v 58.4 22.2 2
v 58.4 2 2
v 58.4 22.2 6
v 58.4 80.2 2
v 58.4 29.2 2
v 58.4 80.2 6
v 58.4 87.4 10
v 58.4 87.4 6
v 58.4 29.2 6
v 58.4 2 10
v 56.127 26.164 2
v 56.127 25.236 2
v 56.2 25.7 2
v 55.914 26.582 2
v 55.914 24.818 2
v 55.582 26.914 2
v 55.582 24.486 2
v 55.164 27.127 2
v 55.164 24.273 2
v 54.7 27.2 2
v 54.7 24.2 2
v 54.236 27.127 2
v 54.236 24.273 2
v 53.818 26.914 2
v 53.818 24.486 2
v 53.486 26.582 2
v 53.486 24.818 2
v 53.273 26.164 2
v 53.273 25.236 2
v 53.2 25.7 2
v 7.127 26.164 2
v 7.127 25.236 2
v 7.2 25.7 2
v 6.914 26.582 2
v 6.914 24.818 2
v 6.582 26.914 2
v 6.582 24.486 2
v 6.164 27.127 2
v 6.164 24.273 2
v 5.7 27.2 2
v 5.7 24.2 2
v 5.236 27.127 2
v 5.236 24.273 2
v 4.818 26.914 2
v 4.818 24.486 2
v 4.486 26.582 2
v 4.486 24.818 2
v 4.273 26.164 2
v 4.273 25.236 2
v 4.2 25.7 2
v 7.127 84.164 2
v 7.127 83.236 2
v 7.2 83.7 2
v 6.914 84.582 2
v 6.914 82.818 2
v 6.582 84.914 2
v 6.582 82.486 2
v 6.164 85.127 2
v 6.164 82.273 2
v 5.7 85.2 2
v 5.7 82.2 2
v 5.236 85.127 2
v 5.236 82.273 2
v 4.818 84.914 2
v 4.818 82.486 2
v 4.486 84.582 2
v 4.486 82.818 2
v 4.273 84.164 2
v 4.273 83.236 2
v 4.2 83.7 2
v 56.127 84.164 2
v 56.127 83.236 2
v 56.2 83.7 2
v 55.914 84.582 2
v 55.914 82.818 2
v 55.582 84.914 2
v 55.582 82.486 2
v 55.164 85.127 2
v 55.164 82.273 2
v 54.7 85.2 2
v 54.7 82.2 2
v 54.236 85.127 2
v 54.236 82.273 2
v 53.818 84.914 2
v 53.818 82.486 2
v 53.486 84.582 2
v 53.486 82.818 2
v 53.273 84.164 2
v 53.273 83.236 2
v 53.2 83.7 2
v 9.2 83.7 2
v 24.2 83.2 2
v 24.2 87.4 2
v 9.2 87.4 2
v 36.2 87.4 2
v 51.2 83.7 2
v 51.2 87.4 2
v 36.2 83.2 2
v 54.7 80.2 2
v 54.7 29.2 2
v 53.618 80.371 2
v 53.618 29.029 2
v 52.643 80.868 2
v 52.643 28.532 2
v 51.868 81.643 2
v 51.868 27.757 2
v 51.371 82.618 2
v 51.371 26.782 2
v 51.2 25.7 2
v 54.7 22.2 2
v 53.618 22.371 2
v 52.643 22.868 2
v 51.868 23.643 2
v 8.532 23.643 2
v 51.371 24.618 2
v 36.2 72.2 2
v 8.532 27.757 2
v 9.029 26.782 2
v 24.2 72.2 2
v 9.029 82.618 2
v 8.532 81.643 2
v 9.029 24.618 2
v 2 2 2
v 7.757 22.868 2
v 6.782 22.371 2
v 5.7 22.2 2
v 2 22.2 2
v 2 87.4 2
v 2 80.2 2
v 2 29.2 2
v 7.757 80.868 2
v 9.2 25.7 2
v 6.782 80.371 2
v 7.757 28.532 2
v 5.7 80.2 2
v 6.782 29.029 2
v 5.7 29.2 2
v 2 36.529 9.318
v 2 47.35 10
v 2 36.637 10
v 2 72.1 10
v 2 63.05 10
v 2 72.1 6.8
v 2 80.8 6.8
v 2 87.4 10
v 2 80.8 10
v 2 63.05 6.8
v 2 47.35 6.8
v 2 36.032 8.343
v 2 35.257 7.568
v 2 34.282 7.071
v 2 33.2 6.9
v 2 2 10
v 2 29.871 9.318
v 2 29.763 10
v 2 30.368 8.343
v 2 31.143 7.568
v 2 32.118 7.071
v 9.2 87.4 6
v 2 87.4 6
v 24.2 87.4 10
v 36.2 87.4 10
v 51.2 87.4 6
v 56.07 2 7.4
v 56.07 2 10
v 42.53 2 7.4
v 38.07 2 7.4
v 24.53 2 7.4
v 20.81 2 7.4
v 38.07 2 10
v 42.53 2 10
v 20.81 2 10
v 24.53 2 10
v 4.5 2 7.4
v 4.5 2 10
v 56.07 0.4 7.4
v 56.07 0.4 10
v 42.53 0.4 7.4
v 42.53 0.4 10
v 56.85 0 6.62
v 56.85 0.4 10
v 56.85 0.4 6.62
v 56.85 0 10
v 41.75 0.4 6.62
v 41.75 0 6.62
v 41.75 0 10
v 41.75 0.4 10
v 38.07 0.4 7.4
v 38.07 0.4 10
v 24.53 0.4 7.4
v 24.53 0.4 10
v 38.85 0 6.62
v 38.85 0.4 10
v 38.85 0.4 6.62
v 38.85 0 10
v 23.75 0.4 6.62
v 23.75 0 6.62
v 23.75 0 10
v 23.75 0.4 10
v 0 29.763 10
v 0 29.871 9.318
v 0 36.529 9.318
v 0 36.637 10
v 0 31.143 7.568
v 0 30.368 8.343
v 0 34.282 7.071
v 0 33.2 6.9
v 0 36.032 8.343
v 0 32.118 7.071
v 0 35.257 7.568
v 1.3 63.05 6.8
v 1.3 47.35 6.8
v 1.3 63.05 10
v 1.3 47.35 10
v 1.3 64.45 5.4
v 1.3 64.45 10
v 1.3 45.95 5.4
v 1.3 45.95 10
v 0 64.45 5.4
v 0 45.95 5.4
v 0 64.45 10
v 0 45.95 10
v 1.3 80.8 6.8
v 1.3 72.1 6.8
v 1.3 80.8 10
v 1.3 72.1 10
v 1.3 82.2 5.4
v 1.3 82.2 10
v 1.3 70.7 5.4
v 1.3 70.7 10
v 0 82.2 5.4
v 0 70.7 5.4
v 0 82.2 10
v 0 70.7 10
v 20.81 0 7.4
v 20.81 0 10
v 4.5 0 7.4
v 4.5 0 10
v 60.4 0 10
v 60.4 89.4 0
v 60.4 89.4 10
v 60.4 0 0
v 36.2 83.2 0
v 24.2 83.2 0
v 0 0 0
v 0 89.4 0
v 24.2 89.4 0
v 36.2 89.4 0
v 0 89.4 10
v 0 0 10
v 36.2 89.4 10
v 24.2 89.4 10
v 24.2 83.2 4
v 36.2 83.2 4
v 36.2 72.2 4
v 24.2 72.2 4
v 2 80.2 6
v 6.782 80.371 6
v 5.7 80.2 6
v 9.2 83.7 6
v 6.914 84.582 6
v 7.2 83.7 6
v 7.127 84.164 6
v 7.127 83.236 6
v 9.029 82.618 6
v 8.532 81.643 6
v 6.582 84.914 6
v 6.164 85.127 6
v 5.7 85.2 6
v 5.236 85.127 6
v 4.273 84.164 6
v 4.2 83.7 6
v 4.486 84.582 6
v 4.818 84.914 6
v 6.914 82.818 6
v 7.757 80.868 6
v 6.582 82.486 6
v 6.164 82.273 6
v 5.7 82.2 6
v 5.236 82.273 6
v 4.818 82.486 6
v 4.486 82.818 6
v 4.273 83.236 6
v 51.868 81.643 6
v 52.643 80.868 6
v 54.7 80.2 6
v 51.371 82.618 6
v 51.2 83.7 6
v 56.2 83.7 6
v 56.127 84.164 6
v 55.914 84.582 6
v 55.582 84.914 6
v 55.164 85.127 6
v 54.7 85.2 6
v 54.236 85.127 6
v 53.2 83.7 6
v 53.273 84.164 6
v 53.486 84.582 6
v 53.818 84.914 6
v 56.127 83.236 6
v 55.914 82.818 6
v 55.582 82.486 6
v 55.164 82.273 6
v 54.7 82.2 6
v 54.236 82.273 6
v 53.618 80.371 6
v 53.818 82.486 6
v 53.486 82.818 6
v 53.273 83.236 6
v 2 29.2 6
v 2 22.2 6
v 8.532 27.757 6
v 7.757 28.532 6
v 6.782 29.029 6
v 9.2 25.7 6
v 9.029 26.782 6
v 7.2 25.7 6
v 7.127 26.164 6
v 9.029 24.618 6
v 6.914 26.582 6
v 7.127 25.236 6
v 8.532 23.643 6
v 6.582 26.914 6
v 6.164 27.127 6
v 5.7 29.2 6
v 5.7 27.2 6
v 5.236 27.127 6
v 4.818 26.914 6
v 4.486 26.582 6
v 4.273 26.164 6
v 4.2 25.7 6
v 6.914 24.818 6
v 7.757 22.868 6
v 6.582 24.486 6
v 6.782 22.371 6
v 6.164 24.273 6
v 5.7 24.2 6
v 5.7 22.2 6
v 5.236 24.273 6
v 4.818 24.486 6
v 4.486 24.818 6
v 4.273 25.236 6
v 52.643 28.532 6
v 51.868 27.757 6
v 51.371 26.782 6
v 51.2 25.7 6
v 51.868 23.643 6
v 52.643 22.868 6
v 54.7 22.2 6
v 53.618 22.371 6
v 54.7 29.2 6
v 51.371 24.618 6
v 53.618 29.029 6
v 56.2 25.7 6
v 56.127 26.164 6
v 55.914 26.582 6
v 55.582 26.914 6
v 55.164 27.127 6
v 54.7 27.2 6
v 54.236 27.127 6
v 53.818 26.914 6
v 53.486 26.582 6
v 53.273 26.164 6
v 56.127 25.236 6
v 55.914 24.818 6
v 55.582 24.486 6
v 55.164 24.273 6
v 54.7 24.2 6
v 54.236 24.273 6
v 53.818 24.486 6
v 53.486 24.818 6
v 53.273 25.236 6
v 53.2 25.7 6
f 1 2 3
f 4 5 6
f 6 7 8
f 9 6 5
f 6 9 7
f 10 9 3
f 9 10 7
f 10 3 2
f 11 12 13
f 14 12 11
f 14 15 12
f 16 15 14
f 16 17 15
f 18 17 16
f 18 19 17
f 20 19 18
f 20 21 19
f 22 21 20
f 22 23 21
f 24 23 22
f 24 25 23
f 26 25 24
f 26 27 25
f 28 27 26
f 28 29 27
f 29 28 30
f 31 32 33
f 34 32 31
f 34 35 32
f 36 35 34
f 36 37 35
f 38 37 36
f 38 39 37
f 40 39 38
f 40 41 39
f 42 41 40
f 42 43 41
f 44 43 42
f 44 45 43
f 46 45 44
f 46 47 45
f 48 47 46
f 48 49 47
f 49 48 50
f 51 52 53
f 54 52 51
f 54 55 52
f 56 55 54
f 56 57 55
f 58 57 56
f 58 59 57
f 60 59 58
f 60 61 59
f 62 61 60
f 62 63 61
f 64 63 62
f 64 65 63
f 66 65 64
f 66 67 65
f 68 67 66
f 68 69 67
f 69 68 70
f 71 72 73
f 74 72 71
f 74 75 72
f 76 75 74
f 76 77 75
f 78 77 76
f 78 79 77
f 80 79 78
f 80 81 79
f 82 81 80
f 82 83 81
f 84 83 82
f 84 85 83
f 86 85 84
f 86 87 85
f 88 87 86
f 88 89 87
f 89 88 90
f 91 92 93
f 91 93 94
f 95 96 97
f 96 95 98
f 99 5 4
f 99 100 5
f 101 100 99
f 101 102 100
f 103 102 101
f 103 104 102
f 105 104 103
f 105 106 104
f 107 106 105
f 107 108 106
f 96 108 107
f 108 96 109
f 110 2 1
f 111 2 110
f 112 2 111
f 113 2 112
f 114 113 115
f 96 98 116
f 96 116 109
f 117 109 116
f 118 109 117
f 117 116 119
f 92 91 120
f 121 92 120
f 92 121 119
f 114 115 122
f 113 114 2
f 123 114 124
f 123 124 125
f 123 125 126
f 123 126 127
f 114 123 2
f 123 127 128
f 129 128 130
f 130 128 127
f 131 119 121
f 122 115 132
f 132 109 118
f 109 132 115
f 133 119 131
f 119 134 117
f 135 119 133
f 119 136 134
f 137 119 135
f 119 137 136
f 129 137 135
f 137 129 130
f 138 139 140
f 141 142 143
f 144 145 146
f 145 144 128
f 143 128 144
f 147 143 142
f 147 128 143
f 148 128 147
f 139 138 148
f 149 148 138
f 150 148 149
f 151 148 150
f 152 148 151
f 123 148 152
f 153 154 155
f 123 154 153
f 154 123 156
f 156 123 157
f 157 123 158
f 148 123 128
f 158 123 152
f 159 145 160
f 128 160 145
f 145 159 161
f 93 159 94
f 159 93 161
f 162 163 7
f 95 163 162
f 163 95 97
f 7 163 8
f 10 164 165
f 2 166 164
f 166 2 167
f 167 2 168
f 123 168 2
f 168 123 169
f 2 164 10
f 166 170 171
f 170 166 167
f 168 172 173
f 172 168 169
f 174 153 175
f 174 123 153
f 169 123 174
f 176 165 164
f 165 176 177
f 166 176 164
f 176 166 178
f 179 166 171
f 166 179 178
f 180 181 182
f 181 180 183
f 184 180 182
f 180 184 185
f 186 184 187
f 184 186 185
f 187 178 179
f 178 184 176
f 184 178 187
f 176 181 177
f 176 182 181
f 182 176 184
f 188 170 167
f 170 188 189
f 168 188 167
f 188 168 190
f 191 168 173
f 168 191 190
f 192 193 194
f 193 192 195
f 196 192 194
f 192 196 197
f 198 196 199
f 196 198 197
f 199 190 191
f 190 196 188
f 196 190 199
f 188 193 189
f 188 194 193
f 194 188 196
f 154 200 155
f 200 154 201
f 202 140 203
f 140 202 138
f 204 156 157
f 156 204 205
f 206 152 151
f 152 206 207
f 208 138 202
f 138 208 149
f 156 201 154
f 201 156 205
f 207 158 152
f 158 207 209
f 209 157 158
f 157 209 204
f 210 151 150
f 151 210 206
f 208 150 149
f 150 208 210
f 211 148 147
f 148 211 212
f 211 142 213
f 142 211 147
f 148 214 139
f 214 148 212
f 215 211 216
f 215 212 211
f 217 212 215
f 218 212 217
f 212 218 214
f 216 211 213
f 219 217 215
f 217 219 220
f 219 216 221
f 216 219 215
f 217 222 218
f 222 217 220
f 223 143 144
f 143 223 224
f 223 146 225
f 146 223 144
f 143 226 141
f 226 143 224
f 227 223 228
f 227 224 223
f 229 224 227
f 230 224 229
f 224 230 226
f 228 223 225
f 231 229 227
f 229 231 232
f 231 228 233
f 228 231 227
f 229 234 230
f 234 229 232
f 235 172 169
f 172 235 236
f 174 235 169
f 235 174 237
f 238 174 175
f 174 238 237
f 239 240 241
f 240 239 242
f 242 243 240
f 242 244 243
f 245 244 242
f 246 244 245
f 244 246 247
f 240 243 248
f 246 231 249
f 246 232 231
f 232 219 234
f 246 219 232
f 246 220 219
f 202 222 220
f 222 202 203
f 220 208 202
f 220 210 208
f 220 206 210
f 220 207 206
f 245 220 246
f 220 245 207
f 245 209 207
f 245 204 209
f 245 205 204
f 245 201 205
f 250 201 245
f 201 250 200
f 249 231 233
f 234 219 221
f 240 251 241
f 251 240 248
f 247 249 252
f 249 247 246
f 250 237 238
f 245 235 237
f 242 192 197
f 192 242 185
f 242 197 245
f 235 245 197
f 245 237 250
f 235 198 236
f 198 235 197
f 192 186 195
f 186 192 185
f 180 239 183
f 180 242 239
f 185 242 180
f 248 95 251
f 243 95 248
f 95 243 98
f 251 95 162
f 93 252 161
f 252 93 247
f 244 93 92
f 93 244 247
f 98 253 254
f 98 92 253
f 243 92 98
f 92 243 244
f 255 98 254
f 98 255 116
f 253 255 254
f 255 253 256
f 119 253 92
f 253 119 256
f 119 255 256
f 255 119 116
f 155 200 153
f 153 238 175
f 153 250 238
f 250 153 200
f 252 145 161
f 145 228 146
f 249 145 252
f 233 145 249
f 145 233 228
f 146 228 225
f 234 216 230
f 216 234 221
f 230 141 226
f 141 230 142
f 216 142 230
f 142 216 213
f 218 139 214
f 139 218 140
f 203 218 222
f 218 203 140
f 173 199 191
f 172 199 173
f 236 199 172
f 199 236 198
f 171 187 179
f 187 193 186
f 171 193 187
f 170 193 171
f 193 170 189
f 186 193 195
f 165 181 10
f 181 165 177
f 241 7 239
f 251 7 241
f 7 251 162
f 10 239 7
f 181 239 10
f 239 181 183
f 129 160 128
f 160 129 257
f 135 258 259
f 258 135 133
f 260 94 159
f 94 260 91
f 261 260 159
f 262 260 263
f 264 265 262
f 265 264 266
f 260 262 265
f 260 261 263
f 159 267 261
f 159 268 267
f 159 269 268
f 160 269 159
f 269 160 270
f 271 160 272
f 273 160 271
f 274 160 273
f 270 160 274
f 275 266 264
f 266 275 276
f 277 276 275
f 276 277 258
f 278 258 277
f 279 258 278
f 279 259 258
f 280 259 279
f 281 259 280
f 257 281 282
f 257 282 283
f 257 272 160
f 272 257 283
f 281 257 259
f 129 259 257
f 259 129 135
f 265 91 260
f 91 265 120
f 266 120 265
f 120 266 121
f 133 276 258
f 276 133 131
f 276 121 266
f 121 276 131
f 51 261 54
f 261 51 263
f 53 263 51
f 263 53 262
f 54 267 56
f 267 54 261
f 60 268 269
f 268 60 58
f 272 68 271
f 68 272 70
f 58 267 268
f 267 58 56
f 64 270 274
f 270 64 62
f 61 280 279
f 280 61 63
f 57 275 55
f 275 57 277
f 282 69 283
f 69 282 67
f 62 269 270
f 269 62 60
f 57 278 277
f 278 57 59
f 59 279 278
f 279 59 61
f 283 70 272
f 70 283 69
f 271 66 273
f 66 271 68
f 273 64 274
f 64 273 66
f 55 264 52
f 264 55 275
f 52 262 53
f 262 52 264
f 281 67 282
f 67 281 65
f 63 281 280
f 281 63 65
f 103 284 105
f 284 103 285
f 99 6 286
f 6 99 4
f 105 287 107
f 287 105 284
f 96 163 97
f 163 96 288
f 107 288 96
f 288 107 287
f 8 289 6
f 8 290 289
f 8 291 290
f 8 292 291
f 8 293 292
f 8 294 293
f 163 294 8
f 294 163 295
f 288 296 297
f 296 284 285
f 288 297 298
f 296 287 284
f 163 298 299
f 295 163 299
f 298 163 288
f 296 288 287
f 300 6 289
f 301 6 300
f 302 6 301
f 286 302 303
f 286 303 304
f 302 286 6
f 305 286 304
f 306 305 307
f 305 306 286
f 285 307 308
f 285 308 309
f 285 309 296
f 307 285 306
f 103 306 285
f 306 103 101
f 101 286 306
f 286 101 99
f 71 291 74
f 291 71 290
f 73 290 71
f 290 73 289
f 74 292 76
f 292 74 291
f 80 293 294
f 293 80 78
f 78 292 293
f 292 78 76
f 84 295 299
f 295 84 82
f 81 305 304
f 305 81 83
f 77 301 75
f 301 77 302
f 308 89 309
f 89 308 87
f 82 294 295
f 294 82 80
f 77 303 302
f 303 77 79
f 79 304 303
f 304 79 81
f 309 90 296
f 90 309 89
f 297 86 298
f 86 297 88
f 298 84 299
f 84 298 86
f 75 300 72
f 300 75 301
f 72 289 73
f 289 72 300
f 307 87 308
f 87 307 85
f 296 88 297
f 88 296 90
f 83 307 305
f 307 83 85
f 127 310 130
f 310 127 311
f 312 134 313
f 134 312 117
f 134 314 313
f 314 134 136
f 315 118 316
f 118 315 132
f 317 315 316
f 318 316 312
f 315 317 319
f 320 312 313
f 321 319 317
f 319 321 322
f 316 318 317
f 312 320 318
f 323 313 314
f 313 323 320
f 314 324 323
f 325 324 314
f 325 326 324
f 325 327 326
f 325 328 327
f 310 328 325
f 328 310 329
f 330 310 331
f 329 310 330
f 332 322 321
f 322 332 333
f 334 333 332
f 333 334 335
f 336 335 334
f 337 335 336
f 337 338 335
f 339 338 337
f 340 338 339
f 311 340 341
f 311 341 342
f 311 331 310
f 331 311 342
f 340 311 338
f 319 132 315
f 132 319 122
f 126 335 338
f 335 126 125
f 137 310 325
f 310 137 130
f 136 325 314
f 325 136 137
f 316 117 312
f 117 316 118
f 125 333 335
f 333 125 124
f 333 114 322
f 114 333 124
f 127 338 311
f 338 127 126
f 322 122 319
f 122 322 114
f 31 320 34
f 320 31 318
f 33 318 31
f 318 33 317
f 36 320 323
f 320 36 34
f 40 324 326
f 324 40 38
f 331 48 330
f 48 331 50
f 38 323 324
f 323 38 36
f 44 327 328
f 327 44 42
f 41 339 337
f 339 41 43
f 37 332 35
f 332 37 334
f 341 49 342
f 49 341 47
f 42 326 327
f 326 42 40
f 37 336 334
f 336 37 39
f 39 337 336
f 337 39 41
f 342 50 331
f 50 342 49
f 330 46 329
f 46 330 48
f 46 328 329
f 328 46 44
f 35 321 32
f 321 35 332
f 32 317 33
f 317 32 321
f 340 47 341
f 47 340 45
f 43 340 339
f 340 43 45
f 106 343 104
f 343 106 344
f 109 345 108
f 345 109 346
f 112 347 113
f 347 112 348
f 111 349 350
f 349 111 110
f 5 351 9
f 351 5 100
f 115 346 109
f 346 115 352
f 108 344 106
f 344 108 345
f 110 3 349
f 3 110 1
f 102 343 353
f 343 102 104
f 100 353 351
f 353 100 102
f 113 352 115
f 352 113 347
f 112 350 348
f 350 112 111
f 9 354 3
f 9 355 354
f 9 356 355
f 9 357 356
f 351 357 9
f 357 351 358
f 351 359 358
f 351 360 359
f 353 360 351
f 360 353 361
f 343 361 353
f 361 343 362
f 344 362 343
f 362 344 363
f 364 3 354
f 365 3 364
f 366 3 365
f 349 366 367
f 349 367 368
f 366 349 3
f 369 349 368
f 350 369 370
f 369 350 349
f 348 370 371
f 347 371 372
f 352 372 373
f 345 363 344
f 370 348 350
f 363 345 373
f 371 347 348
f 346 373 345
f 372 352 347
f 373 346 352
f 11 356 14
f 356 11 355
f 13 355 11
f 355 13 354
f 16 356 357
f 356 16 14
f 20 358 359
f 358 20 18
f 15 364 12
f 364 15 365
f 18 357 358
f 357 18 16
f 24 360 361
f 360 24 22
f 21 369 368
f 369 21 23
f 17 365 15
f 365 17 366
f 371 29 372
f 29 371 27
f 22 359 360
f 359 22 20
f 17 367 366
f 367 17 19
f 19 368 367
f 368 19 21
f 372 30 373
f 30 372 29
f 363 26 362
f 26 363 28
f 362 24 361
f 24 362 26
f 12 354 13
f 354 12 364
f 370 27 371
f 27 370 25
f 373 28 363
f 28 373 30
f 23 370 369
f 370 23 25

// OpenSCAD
/*
 * Raspberry Pi3 case for Prusa MK3

 * Originally not intended for use with the Prusa MK3; I just wanted a openscad code base to work with to make future cases.
 * I have borrowed the standoff design and the supports at the ports from https://www.thingiverse.com/thing:1325370
 
 * PI Fan hole contributed by: Daniel Tanner https://www.thingiverse.com/cyfire/designs
 * 
 */

/* [Main] */

// Which part to render
part = "base"; // [ lid: Lid, base: Base, both: Box ]

// Make slot for the camera cable
camera_slot = "true"; // [ true: Yes, false: No ]

// Make slot for the video cable
video_slot = "true"; // [ true: Yes, false: No ]

// Make slot for the gpio_connector (not implemented)
gpio_slot = "true"; // [ true: Yes, false: No ]

// Prusa i3 Mk3 mount
mk3_mount = "false"; // [ true: Yes, false: No ]

// Cover holes with single layer, helps some screw hole avoid need for supports, requires to be punched through afterwards ( thanks Angus for the tip )
hole_covers = "true"; // [ true: Yes, false: No ]

// PI Fan
pi_fan = "true"; // [ true: Yes, false: No]
// PI Fan size, only 2 sizes 25 = 25mm and 30 = 30mm
pi_fan_size = 25; // [ 25: 25, 30: 30 ]

/* [Hidden] */

board = [85, 56 , 1.3 ];  //dimension of rasp pi
t     = 1.40;             //Thickness of rasp pi board
p     = 3;              //Thickness of plastic case

_t_wall    = 2;              // Thickness of outer walls
_t_b  = 2;              // Thickness of top and bottom
_rpi_w = 56;
_rpi_l = 85;
_rpi_padding = 0.2;
_rpi_t = 1.4;
_rpi_hole_l_offset = 58;

_inner_h = 12.8; // Just guessing here

_h_rpi_offset = 4 + _t_b;

// This cannot be fiddle with too much as it will break the stereo jack hole
_split_offset = 10;

_hole_offset = 3.5;

_outer_l = _t_wall*2 + _rpi_padding*2 + _rpi_l;
_outer_w = _t_wall*2 + _rpi_padding*2 + _rpi_w;
_outer_h = _t_b*2+_inner_h+_h_rpi_offset;

// translate([_t_wall+_rpi_padding,_t_wall+_rpi_padding,_h_rpi_offset]) rpi();

$fn=20;

//base();
//lid();
//box();

show();

module show() {
    if (part == "lid") {
        rotate([0,180,0]) translate([1,0,-_outer_h]) lid();
    } else if (part == "base") {
        base();
    } else {
        lid();
        base();
    }
}

module rpi() {
    difference() {
        union() {
            cube([_rpi_w,_rpi_l,_rpi_t]);


            // SD card
            _sd_width = 11;
            _sd_depth = 3;
            translate([_rpi_w/2-_sd_width/2,_rpi_l-_t_wall,-_rpi_t-1])
                cube([_sd_width,_sd_depth+_rpi_padding+_t_wall,1]);

            // USB 1
            //usb1  =  [[70   ,21.4 ,0] ,[17.4 ,15.3  , 17.4] ,[0,   -2,    0] , [0,   4, 10  ]];
            // 14.7 is the outer edge, the main module is 13.14
            translate([40.43,-2,_rpi_t]) {
                usb(padding=0);
            }


            // USB 2
            //usb2  =  [[70   ,39   ,0] ,[17.4 ,15.3  , 17.4] ,[0,   -2,    0] , [0,   4, 10  ]];
            translate([22.43,-2,_rpi_t]) {
                usb(padding=0);
            }


            // Ethernet
            translate([2.5,-2,_rpi_t])
                ether(padding=0);

            // Audio
            translate([0,31,_rpi_t])
                audio(padding=0);

            // HDMI
            translate([0,45.75,_rpi_t])
                hdmi(padding=0);

             // Micro USB
            translate([0,70.5,_rpi_t])
                musb(padding=0);

            // Camera
            translate([0,38.6,_rpi_t])
                cube([22.5,2.95,5.7]);

            // Video
            translate([_rpi_w/2-22.5/2,79.55,_rpi_t])
                cube([22.5,2.95,5.7]);

       }


        // holes
        translate([_hole_offset,_rpi_l-_hole_offset,-1]) cylinder(r=2.75/2,h=_rpi_t+2);
        translate([_rpi_w-_hole_offset,_rpi_l-_hole_offset,-1]) cylinder(r=2.75/2,h=_rpi_t+2);
        translate([_hole_offset,_rpi_l-3.5-_rpi_hole_l_offset,-1]) cylinder(r=2.75/2,h=_rpi_t+2);
        translate([_rpi_w-_hole_offset,_rpi_l-_hole_offset-_rpi_hole_l_offset,-1]) cylinder(r=2.75/2,h=_rpi_t+2);
    }
}

module usb(padding=0.2,extends=0.2) {
    _extra_width = (14.7-13.14);
    cube([13.14+2*padding,17.4+2*padding,15.3+padding]);
    translate([-(14.7+2*padding-13.14-2*padding)/2,-extends+0.2,-_extra_width/2]) cube([14.7+2*padding,extends,15.3+padding+_extra_width]);
}

module ether(padding=0.2,extends=0) {
    translate([0,-extends,0])
    cube([15.51+2*padding,21.45+extends,13.9+padding]);
}

module audio(padding=0.4,extends=0,hole=true) {
    $fn=20;
    difference() {
        union() {
            translate([0,0,3]) rotate([0,-90,0]) cylinder(r=3+padding,h=2+extends);
            translate([0,-3,0]) cube([11,6,6]);
        }
        if (hole) {
            translate([5,0,3]) rotate([0,-90,0]) cylinder(r=1.5,h=11);
        }
    }
}

module hdmi() {
    difference() {
        union() {
            translate([1,0,0]) cube([10.7,14.5,6.4]);
            hull() {
                translate([-1,0,2]) cube([10.7,14.5,4.4]);
                translate([-1,1,1]) cube([10.7,12.5,5.4]);
            }
        }
        hull() {
            translate([-2,0.5,2.3]) cube([10.7,13.5,3.6]);
            translate([-2,1.6,1.5]) cube([10.7,11.7,2]);
        }
    }
}

module hdmi_hole(padding=0.6,extends=5,outer_padding=2) {
    union() {
        translate([-1-0.1,-padding,-padding])
            cube([10.7+0.1,14.5+padding*2,6.4+padding*2]);

        translate([-1-extends,-outer_padding,-outer_padding])
            cube([extends,14.5+outer_padding*2,6.4+outer_padding*2]);
    }
}

module musb() {
    difference() {
        union() {
            translate([1,0,0]) cube([5.7,7.5,3]);
            hull() {
                translate([-1,0,1]) cube([5.7,7.5,2]);
                translate([-1,1,0.5]) cube([5.7,5.5,2]);
            }
        }
        hull() {
            translate([-1.1,0.2,1.2]) cube([5.7,7.1,1.6]);
            translate([-1.1,1.2,0.7]) cube([5.7,5.1,2]);
        }
    }
}

module musb_hole(padding=0.6,extends=5,outer_padding=2) {
    union() {
        translate([-1-0.1,-padding,-padding])
            cube([5.7+0.1,7.5+padding*2,3+padding*2]);

        translate([-1-extends,-outer_padding,-outer_padding])
            cube([extends,7.5+outer_padding*2,3+outer_padding*2]);
    }
}


module box() {
    
    _sd_width = 12;
    _sd_depth = 3;
    _sd_inset = 4;

    difference() {

        cube([_t_wall*2+_rpi_padding*2+_rpi_w,_t_wall*2+_rpi_padding*2+_rpi_l,_outer_h]);

        difference() {
            translate([_t_wall,_t_wall,_t_b])
                cube([_rpi_padding*2+_rpi_w,_rpi_padding*2+_rpi_l,_outer_h-2*_t_b]);

            translate([0,_t_wall,_outer_h-_t_b])
            rotate([0,90,0])
            linear_extrude(height=_outer_w)
                polygon([[0,0],[0,(_outer_h-_split_offset-_t_b)*0.8],[_outer_h-_split_offset-_t_b,0]]);

        }


        _hole_padding=0.2;

        // SD card slot
        // We assume the slot is "almost" centered
        translate([_t_wall + _rpi_padding + _rpi_w/2 - _sd_width/2, _outer_l-_t_wall-_rpi_padding-_sd_inset,-1])
            cube([_sd_width,_sd_depth+_rpi_padding+_t_wall+_sd_inset+1,_h_rpi_offset+1]);

        translate([_t_wall+_rpi_padding,_t_wall+_rpi_padding,_h_rpi_offset+_rpi_t]) {

            // USB 1
            translate([40.43-_hole_padding/2,-2,0]) {
                usb(padding=_hole_padding,extends=_t_wall);
            }

            // USB 2
            translate([22.43-_hole_padding/2,-2,0]) {
                usb(padding=_hole_padding,extends=_t_wall);
            }

            // Ether
            _ether_padding = _hole_padding + 0.2;
            translate([2.5-_ether_padding/2,-2,0])
                ether(padding=_ether_padding,extends=_t_wall);

            // Audio
            translate([0,31,0])
                audio(padding=0.5,extends=2,hole=false);

            // HDMI
            translate([0.1,45.75,0])
                hdmi_hole(extends=_t_wall*2);

            // Micro USB
            translate([0.1,70.5,0])
                musb_hole();

        }

        // Camera
        if (camera_slot == "true") {
            translate([_t_wall+_rpi_padding,_t_wall+_rpi_padding+38.6,_t_b+_inner_h])
                rounded_slot(22.5,2.95,20);
        }

        if (video_slot == "true") {
            // Video
            translate([_t_wall+_rpi_padding+_rpi_w/2-22.5/2,_t_wall+_rpi_padding+79.55,,_t_b+_inner_h])
                rounded_slot(22.5,2.95,20);
        }

        if (gpio_slot == "true") {
            translate([_t_wall+_rpi_padding+49.9,_t_wall+_rpi_padding+27,5]) cube([5.1,51,20]);
        }

        // Cooling
        translate([_t_wall+_rpi_padding+16,_t_wall+_rpi_padding+20,_t_b+_inner_h]) {
            translate([0,0,0]) rotate([0,0,45]) rounded_slot(22.5,2.95,20);
            translate([8,0,0]) rotate([0,0,45]) rounded_slot(22.5,2.95,20);
            translate([16,0,0]) rotate([0,0,45]) rounded_slot(22.5,2.95,20);
            if (gpio_slot == "true") {
               translate([24,0,0]) rotate([0,0,45]) rounded_slot(22.5/2,2.95,20);
            } else {
               translate([24,0,0]) rotate([0,0,45]) rounded_slot(22.5,2.95,20);
            }

        }

        if (pi_fan == "true") {
            if (pi_fan_size == 25){
                translate([18,50,20]) 25mmFan();
            }
            if (pi_fan_size == 30) {
                translate([16,48,20]) 30mmFan();
            }
        } else {
            translate([_t_wall+_rpi_padding+18,_t_wall+_rpi_padding+50,_t_b+_inner_h]) {
                translate([0,0,0]) rotate([0,0,125]) rounded_slot(22.5,2.95,20);
                translate([8,0,0]) rotate([0,0,125]) rounded_slot(22.5,2.95,20);
                translate([16,0,0]) rotate([0,0,125]) rounded_slot(22.5,2.95,20);
                translate([24,0,0]) rotate([0,0,125]) rounded_slot(22.5,2.95,20);
            }
                if (gpio_slot == "true") {
                    translate([32,0,0]) rotate([0,0,125]) translate([22.5/2,0,0]) rounded_slot(22.5/2,2.95,20);
                } else {
                    translate([32,0,0]) rotate([0,0,125]) rounded_slot(22.5,2.95,20);
                }
            }

    }
    
    // SD card slot support
    // We assume the slot is "almost" centered
    
    translate([_t_wall + _rpi_padding + _rpi_w/2 - _sd_width/2, _outer_l-_t_wall-_rpi_padding-11-_sd_inset,0])
        cube([_sd_width,11,_h_rpi_offset-2]);



}

module rounded_slot(l,t,h) {
    translate([t/2,t/2,0])
    hull() {
        cylinder(r=t/2,h=h);
        translate([l-t,0,0]) cylinder(r=t/2,h=h);
    }
}


module lid_cut() {
    difference() {
        box();
        translate([-1,-1,_split_offset-200])
            cube([_rpi_w*2,_rpi_l*2,200]);
    }
}

module lid() {




    _standoff_r=3.5;
    // Screw standoffs
    _height_start = _h_rpi_offset+_rpi_t+0.5;
    _height = _outer_h - _height_start;
    _hole_inset_r=3;

    difference() {
        union() {
            lid_cut();

            // Flap out for the SD card
            _sd_width = 11;
            _sd_depth = 3;
            translate([_t_wall + _rpi_padding + _rpi_w/2 - _sd_width/2, _t_wall+_rpi_padding*2 + _rpi_l,_h_rpi_offset])
                cube([_sd_width,_t_wall,_h_rpi_offset+1]);

            // Standoffs
            translate([0,0,_h_rpi_offset+_rpi_t+0.5]) {
                translate([_t_wall+_rpi_padding+_hole_offset,_t_wall+_rpi_padding+_rpi_l-_hole_offset,0])
                {
                    hull() {
                        cylinder(r=_standoff_r,h=_height);
                        translate([-_standoff_r,_hole_offset+_rpi_padding-1,0]) cube([_standoff_r*2,1,_height]);
                        translate([-_hole_offset-_rpi_padding,-_standoff_r,0]) cube([1,_standoff_r*2,_height]);
                        translate([-_rpi_padding-_hole_offset,0,0])  cube([_rpi_padding+_hole_offset,_rpi_padding+_hole_offset,_height]);
                    }
                }


                translate([_t_wall+_rpi_padding+_rpi_w-_hole_offset,_t_wall+_rpi_padding+_rpi_l-_hole_offset,0])
                {
                    hull() {
                        cylinder(r=_standoff_r,h=_height);
                        translate([-_standoff_r,_hole_offset+_rpi_padding-1,0]) cube([_standoff_r*2,1,_height]);
                        translate([_hole_offset+_rpi_padding-1,-_standoff_r,0]) cube([1,_standoff_r*2,_height]);
                        translate([0,0,0])  cube([_rpi_padding+_hole_offset,_rpi_padding+_hole_offset,_height]);
                    }
                }

                translate([_t_wall+_rpi_padding+_hole_offset,_t_wall+_rpi_padding+_rpi_l-_hole_offset-_rpi_hole_l_offset,0])
                {
                    hull() {
                        cylinder(r=_standoff_r,h=_height);
                        translate([-_hole_offset-_rpi_padding,-_standoff_r,0]) cube([1,_standoff_r*2,_height]);
                    }
                }

                translate([_t_wall+_rpi_padding+_rpi_w-_hole_offset,_t_wall+_rpi_padding+_rpi_l-_hole_offset-_rpi_hole_l_offset,0])
                {
                    hull() {
                        cylinder(r=_standoff_r,h=_height);
                        translate([_hole_offset+_rpi_padding-1,-_standoff_r,0]) cube([1,_standoff_r*2,_height]);
                    }
                }
            }
        }

        // Screw holes

        _standoff_hole_r=1.7;
        translate([_t_wall+_rpi_padding,_t_wall+_rpi_padding,0]) {
            translate([_hole_offset,_rpi_l-_hole_offset,0])
            {
               translate([0,0,-1]) cylinder(r=_standoff_hole_r,h=_height*2);
               translate([0,0,_outer_h-3]) cylinder(r=_hole_inset_r,h=4);
            }

            translate([_rpi_w-_hole_offset,_rpi_l-_hole_offset,0])
            {
               translate([0,0,-1]) cylinder(r=_standoff_hole_r,h=_height*2);
                translate([0,0,_outer_h-3]) cylinder(r=_hole_inset_r,h=4);
            }

            translate([_hole_offset,_rpi_l-_hole_offset-_rpi_hole_l_offset,0])
            {
               translate([0,0,-1]) cylinder(r=_standoff_hole_r,h=_height*2);
               translate([0,0,_outer_h-3]) cylinder(r=_hole_inset_r,h=4);
            }

            translate([_rpi_w-_hole_offset,_rpi_l-_hole_offset-_rpi_hole_l_offset,0])
            {
                translate([0,0,-1]) cylinder(r=_standoff_hole_r,h=_height*2);
                translate([0,0,_outer_h-3]) cylinder(r=_hole_inset_r,h=4);
            }
        }


    }

    if (hole_covers == "true") {
        translate([_t_wall+_rpi_padding,_t_wall+_rpi_padding,_outer_h-3]) {

            translate([_hole_offset,_rpi_l-_hole_offset,0])
            {
               cylinder(r=_hole_inset_r+0.1,h=0.2);
            }

            translate([_rpi_w-_hole_offset,_rpi_l-_hole_offset,0])
            {
                cylinder(r=_hole_inset_r+0.1,h=0.2);
            }

            translate([_hole_offset,_rpi_l-_hole_offset-_rpi_hole_l_offset,0])
            {
                cylinder(r=_hole_inset_r+0.1,h=0.2);
            }

            translate([_rpi_w-_hole_offset,_rpi_l-_hole_offset-_rpi_hole_l_offset,0])
            {
                cylinder(r=_hole_inset_r+0.1,h=0.2);
            }

        }
    }

}

module base_cut() {
    difference() {
        box();
        translate([-1,-1,_split_offset])
            cube([_rpi_w*2,_rpi_l*2,(_inner_h+_h_rpi_offset)*2]);
    }
}

module base() {

    difference() {

        union() {

            base_cut();

            _standoff_r=3.5;
            _standoff_hole_r=1.5;


            // Screw standoffs
            translate([_t_wall+_rpi_padding+_hole_offset,_t_wall+_rpi_padding+_rpi_l-_hole_offset,0])
            {
                difference() {
                    hull() {
                        cylinder(r=_standoff_r,h=_h_rpi_offset);
                        translate([-_standoff_r,_hole_offset+_rpi_padding-1,0]) cube([_standoff_r*2,1,_h_rpi_offset]);
                        translate([-_hole_offset-_rpi_padding,-_standoff_r,0]) cube([1,_standoff_r*2,_h_rpi_offset]);
                        translate([-_rpi_padding-_hole_offset,0,0])  cube([_rpi_padding+_hole_offset,_rpi_padding+_hole_offset,_h_rpi_offset]);
                    }
                    translate([0,0,_t_b]) cylinder(r=_standoff_hole_r,h=_h_rpi_offset);
                }
            }


            translate([_t_wall+_rpi_padding+_rpi_w-_hole_offset,_t_wall+_rpi_padding+_rpi_l-_hole_offset,0])
            {
                difference() {
                    hull() {
                        cylinder(r=_standoff_r,h=_h_rpi_offset);
                        translate([-_standoff_r,_hole_offset+_rpi_padding-1,0]) cube([_standoff_r*2,1,_h_rpi_offset]);
                        translate([_hole_offset+_rpi_padding,-_standoff_r,0]) cube([1,_standoff_r*2,_h_rpi_offset]);
                        translate([0,0,0])  cube([_rpi_padding+_hole_offset,_rpi_padding+_hole_offset,_h_rpi_offset]);
                    }
                    translate([0,0,_t_b]) cylinder(r=_standoff_hole_r,h=_h_rpi_offset);
                }
            }

            translate([_t_wall+_rpi_padding+_hole_offset,_t_wall+_rpi_padding+_rpi_l-_hole_offset-_rpi_hole_l_offset,0])
            {
                difference() {
                    hull() {
                        cylinder(r=_standoff_r,h=_h_rpi_offset);
                        translate([-_hole_offset-_rpi_padding,-_standoff_r,0]) cube([1,_standoff_r*2,_h_rpi_offset]);
                    }
                    translate([0,0,_t_b]) cylinder(r=_standoff_hole_r,h=_h_rpi_offset);
                }
            }

            translate([_t_wall+_rpi_padding+_rpi_w-_hole_offset,_t_wall+_rpi_padding+_rpi_l-_hole_offset-_rpi_hole_l_offset,0])
            {
                difference() {
                    hull() {
                        cylinder(r=_standoff_r,h=_h_rpi_offset);
                        translate([_hole_offset+_rpi_padding,-_standoff_r,0]) cube([1,_standoff_r*2,_h_rpi_offset]);
                    }
                    translate([0,0,_t_b]) cylinder(r=_standoff_hole_r,h=_h_rpi_offset);
                }
            }
        }

        // Cut out for the SD card
        _sd_width = 12;
        _sd_depth = 3;
        translate([_t_wall + _rpi_padding + _rpi_w/2 - _sd_width/2, _outer_l-_t_wall-_rpi_padding,4])
            cube([_sd_width,_sd_depth+_rpi_padding+_t_wall+1,_h_rpi_offset+1]);

    }


    if (mk3_mount == "true") {

        translate([_outer_w,_outer_l,0])
        difference() {
            union() {
                rotate([0,-90,0])
                linear_extrude(height=4)
                    polygon([[0,-1],[_split_offset,-1],[_split_offset,0.5],[50,0.5],[50,20],[0,20]]);

                linear_extrude(height=_split_offset)
                    polygon([[-24,-1],[-4,20],[-4,20-2],[-22,-1]]);
            }

            translate([-5,10,4]) rotate([0,90,0]) cylinder(r=1.5,h=6);
            translate([-20,10,4]) rotate([0,90,0]) cylinder(r=3,h=12);
            translate([-5,10,50-3]) rotate([0,90,0]) cylinder(r=1.5,h=6);

        }
    }

}

module 30mmFan(){
    translate([2,2,0])cylinder(r=1.5,h=5);// fan screw holes
    translate([26.5,2,0])cylinder(r=1.5,h=5);// fan screw holes
    translate([2,24.5,0])cylinder(r=1.5,h=5);// fan screw holes
    translate([26.5,24.5,0])cylinder(r=1.5,h=5);// fan screw holes
    translate([25.03/2,25.03/2,0])cylinder(r=25.03/2,h=5);//
}

module 25mmFan(){
    translate([2,2,0])cylinder(r=1.5,h=5);// fan screw holes
    translate([22,2,0])cylinder(r=1.5,h=5);// fan screw holes
    translate([2,22.5,0])cylinder(r=1.5,h=5);// fan screw holes
    translate([22,22,0])cylinder(r=1.5,h=5);// fan screw holes
    translate([12,12,0])cylinder(r=11.5,h=5);//
}
